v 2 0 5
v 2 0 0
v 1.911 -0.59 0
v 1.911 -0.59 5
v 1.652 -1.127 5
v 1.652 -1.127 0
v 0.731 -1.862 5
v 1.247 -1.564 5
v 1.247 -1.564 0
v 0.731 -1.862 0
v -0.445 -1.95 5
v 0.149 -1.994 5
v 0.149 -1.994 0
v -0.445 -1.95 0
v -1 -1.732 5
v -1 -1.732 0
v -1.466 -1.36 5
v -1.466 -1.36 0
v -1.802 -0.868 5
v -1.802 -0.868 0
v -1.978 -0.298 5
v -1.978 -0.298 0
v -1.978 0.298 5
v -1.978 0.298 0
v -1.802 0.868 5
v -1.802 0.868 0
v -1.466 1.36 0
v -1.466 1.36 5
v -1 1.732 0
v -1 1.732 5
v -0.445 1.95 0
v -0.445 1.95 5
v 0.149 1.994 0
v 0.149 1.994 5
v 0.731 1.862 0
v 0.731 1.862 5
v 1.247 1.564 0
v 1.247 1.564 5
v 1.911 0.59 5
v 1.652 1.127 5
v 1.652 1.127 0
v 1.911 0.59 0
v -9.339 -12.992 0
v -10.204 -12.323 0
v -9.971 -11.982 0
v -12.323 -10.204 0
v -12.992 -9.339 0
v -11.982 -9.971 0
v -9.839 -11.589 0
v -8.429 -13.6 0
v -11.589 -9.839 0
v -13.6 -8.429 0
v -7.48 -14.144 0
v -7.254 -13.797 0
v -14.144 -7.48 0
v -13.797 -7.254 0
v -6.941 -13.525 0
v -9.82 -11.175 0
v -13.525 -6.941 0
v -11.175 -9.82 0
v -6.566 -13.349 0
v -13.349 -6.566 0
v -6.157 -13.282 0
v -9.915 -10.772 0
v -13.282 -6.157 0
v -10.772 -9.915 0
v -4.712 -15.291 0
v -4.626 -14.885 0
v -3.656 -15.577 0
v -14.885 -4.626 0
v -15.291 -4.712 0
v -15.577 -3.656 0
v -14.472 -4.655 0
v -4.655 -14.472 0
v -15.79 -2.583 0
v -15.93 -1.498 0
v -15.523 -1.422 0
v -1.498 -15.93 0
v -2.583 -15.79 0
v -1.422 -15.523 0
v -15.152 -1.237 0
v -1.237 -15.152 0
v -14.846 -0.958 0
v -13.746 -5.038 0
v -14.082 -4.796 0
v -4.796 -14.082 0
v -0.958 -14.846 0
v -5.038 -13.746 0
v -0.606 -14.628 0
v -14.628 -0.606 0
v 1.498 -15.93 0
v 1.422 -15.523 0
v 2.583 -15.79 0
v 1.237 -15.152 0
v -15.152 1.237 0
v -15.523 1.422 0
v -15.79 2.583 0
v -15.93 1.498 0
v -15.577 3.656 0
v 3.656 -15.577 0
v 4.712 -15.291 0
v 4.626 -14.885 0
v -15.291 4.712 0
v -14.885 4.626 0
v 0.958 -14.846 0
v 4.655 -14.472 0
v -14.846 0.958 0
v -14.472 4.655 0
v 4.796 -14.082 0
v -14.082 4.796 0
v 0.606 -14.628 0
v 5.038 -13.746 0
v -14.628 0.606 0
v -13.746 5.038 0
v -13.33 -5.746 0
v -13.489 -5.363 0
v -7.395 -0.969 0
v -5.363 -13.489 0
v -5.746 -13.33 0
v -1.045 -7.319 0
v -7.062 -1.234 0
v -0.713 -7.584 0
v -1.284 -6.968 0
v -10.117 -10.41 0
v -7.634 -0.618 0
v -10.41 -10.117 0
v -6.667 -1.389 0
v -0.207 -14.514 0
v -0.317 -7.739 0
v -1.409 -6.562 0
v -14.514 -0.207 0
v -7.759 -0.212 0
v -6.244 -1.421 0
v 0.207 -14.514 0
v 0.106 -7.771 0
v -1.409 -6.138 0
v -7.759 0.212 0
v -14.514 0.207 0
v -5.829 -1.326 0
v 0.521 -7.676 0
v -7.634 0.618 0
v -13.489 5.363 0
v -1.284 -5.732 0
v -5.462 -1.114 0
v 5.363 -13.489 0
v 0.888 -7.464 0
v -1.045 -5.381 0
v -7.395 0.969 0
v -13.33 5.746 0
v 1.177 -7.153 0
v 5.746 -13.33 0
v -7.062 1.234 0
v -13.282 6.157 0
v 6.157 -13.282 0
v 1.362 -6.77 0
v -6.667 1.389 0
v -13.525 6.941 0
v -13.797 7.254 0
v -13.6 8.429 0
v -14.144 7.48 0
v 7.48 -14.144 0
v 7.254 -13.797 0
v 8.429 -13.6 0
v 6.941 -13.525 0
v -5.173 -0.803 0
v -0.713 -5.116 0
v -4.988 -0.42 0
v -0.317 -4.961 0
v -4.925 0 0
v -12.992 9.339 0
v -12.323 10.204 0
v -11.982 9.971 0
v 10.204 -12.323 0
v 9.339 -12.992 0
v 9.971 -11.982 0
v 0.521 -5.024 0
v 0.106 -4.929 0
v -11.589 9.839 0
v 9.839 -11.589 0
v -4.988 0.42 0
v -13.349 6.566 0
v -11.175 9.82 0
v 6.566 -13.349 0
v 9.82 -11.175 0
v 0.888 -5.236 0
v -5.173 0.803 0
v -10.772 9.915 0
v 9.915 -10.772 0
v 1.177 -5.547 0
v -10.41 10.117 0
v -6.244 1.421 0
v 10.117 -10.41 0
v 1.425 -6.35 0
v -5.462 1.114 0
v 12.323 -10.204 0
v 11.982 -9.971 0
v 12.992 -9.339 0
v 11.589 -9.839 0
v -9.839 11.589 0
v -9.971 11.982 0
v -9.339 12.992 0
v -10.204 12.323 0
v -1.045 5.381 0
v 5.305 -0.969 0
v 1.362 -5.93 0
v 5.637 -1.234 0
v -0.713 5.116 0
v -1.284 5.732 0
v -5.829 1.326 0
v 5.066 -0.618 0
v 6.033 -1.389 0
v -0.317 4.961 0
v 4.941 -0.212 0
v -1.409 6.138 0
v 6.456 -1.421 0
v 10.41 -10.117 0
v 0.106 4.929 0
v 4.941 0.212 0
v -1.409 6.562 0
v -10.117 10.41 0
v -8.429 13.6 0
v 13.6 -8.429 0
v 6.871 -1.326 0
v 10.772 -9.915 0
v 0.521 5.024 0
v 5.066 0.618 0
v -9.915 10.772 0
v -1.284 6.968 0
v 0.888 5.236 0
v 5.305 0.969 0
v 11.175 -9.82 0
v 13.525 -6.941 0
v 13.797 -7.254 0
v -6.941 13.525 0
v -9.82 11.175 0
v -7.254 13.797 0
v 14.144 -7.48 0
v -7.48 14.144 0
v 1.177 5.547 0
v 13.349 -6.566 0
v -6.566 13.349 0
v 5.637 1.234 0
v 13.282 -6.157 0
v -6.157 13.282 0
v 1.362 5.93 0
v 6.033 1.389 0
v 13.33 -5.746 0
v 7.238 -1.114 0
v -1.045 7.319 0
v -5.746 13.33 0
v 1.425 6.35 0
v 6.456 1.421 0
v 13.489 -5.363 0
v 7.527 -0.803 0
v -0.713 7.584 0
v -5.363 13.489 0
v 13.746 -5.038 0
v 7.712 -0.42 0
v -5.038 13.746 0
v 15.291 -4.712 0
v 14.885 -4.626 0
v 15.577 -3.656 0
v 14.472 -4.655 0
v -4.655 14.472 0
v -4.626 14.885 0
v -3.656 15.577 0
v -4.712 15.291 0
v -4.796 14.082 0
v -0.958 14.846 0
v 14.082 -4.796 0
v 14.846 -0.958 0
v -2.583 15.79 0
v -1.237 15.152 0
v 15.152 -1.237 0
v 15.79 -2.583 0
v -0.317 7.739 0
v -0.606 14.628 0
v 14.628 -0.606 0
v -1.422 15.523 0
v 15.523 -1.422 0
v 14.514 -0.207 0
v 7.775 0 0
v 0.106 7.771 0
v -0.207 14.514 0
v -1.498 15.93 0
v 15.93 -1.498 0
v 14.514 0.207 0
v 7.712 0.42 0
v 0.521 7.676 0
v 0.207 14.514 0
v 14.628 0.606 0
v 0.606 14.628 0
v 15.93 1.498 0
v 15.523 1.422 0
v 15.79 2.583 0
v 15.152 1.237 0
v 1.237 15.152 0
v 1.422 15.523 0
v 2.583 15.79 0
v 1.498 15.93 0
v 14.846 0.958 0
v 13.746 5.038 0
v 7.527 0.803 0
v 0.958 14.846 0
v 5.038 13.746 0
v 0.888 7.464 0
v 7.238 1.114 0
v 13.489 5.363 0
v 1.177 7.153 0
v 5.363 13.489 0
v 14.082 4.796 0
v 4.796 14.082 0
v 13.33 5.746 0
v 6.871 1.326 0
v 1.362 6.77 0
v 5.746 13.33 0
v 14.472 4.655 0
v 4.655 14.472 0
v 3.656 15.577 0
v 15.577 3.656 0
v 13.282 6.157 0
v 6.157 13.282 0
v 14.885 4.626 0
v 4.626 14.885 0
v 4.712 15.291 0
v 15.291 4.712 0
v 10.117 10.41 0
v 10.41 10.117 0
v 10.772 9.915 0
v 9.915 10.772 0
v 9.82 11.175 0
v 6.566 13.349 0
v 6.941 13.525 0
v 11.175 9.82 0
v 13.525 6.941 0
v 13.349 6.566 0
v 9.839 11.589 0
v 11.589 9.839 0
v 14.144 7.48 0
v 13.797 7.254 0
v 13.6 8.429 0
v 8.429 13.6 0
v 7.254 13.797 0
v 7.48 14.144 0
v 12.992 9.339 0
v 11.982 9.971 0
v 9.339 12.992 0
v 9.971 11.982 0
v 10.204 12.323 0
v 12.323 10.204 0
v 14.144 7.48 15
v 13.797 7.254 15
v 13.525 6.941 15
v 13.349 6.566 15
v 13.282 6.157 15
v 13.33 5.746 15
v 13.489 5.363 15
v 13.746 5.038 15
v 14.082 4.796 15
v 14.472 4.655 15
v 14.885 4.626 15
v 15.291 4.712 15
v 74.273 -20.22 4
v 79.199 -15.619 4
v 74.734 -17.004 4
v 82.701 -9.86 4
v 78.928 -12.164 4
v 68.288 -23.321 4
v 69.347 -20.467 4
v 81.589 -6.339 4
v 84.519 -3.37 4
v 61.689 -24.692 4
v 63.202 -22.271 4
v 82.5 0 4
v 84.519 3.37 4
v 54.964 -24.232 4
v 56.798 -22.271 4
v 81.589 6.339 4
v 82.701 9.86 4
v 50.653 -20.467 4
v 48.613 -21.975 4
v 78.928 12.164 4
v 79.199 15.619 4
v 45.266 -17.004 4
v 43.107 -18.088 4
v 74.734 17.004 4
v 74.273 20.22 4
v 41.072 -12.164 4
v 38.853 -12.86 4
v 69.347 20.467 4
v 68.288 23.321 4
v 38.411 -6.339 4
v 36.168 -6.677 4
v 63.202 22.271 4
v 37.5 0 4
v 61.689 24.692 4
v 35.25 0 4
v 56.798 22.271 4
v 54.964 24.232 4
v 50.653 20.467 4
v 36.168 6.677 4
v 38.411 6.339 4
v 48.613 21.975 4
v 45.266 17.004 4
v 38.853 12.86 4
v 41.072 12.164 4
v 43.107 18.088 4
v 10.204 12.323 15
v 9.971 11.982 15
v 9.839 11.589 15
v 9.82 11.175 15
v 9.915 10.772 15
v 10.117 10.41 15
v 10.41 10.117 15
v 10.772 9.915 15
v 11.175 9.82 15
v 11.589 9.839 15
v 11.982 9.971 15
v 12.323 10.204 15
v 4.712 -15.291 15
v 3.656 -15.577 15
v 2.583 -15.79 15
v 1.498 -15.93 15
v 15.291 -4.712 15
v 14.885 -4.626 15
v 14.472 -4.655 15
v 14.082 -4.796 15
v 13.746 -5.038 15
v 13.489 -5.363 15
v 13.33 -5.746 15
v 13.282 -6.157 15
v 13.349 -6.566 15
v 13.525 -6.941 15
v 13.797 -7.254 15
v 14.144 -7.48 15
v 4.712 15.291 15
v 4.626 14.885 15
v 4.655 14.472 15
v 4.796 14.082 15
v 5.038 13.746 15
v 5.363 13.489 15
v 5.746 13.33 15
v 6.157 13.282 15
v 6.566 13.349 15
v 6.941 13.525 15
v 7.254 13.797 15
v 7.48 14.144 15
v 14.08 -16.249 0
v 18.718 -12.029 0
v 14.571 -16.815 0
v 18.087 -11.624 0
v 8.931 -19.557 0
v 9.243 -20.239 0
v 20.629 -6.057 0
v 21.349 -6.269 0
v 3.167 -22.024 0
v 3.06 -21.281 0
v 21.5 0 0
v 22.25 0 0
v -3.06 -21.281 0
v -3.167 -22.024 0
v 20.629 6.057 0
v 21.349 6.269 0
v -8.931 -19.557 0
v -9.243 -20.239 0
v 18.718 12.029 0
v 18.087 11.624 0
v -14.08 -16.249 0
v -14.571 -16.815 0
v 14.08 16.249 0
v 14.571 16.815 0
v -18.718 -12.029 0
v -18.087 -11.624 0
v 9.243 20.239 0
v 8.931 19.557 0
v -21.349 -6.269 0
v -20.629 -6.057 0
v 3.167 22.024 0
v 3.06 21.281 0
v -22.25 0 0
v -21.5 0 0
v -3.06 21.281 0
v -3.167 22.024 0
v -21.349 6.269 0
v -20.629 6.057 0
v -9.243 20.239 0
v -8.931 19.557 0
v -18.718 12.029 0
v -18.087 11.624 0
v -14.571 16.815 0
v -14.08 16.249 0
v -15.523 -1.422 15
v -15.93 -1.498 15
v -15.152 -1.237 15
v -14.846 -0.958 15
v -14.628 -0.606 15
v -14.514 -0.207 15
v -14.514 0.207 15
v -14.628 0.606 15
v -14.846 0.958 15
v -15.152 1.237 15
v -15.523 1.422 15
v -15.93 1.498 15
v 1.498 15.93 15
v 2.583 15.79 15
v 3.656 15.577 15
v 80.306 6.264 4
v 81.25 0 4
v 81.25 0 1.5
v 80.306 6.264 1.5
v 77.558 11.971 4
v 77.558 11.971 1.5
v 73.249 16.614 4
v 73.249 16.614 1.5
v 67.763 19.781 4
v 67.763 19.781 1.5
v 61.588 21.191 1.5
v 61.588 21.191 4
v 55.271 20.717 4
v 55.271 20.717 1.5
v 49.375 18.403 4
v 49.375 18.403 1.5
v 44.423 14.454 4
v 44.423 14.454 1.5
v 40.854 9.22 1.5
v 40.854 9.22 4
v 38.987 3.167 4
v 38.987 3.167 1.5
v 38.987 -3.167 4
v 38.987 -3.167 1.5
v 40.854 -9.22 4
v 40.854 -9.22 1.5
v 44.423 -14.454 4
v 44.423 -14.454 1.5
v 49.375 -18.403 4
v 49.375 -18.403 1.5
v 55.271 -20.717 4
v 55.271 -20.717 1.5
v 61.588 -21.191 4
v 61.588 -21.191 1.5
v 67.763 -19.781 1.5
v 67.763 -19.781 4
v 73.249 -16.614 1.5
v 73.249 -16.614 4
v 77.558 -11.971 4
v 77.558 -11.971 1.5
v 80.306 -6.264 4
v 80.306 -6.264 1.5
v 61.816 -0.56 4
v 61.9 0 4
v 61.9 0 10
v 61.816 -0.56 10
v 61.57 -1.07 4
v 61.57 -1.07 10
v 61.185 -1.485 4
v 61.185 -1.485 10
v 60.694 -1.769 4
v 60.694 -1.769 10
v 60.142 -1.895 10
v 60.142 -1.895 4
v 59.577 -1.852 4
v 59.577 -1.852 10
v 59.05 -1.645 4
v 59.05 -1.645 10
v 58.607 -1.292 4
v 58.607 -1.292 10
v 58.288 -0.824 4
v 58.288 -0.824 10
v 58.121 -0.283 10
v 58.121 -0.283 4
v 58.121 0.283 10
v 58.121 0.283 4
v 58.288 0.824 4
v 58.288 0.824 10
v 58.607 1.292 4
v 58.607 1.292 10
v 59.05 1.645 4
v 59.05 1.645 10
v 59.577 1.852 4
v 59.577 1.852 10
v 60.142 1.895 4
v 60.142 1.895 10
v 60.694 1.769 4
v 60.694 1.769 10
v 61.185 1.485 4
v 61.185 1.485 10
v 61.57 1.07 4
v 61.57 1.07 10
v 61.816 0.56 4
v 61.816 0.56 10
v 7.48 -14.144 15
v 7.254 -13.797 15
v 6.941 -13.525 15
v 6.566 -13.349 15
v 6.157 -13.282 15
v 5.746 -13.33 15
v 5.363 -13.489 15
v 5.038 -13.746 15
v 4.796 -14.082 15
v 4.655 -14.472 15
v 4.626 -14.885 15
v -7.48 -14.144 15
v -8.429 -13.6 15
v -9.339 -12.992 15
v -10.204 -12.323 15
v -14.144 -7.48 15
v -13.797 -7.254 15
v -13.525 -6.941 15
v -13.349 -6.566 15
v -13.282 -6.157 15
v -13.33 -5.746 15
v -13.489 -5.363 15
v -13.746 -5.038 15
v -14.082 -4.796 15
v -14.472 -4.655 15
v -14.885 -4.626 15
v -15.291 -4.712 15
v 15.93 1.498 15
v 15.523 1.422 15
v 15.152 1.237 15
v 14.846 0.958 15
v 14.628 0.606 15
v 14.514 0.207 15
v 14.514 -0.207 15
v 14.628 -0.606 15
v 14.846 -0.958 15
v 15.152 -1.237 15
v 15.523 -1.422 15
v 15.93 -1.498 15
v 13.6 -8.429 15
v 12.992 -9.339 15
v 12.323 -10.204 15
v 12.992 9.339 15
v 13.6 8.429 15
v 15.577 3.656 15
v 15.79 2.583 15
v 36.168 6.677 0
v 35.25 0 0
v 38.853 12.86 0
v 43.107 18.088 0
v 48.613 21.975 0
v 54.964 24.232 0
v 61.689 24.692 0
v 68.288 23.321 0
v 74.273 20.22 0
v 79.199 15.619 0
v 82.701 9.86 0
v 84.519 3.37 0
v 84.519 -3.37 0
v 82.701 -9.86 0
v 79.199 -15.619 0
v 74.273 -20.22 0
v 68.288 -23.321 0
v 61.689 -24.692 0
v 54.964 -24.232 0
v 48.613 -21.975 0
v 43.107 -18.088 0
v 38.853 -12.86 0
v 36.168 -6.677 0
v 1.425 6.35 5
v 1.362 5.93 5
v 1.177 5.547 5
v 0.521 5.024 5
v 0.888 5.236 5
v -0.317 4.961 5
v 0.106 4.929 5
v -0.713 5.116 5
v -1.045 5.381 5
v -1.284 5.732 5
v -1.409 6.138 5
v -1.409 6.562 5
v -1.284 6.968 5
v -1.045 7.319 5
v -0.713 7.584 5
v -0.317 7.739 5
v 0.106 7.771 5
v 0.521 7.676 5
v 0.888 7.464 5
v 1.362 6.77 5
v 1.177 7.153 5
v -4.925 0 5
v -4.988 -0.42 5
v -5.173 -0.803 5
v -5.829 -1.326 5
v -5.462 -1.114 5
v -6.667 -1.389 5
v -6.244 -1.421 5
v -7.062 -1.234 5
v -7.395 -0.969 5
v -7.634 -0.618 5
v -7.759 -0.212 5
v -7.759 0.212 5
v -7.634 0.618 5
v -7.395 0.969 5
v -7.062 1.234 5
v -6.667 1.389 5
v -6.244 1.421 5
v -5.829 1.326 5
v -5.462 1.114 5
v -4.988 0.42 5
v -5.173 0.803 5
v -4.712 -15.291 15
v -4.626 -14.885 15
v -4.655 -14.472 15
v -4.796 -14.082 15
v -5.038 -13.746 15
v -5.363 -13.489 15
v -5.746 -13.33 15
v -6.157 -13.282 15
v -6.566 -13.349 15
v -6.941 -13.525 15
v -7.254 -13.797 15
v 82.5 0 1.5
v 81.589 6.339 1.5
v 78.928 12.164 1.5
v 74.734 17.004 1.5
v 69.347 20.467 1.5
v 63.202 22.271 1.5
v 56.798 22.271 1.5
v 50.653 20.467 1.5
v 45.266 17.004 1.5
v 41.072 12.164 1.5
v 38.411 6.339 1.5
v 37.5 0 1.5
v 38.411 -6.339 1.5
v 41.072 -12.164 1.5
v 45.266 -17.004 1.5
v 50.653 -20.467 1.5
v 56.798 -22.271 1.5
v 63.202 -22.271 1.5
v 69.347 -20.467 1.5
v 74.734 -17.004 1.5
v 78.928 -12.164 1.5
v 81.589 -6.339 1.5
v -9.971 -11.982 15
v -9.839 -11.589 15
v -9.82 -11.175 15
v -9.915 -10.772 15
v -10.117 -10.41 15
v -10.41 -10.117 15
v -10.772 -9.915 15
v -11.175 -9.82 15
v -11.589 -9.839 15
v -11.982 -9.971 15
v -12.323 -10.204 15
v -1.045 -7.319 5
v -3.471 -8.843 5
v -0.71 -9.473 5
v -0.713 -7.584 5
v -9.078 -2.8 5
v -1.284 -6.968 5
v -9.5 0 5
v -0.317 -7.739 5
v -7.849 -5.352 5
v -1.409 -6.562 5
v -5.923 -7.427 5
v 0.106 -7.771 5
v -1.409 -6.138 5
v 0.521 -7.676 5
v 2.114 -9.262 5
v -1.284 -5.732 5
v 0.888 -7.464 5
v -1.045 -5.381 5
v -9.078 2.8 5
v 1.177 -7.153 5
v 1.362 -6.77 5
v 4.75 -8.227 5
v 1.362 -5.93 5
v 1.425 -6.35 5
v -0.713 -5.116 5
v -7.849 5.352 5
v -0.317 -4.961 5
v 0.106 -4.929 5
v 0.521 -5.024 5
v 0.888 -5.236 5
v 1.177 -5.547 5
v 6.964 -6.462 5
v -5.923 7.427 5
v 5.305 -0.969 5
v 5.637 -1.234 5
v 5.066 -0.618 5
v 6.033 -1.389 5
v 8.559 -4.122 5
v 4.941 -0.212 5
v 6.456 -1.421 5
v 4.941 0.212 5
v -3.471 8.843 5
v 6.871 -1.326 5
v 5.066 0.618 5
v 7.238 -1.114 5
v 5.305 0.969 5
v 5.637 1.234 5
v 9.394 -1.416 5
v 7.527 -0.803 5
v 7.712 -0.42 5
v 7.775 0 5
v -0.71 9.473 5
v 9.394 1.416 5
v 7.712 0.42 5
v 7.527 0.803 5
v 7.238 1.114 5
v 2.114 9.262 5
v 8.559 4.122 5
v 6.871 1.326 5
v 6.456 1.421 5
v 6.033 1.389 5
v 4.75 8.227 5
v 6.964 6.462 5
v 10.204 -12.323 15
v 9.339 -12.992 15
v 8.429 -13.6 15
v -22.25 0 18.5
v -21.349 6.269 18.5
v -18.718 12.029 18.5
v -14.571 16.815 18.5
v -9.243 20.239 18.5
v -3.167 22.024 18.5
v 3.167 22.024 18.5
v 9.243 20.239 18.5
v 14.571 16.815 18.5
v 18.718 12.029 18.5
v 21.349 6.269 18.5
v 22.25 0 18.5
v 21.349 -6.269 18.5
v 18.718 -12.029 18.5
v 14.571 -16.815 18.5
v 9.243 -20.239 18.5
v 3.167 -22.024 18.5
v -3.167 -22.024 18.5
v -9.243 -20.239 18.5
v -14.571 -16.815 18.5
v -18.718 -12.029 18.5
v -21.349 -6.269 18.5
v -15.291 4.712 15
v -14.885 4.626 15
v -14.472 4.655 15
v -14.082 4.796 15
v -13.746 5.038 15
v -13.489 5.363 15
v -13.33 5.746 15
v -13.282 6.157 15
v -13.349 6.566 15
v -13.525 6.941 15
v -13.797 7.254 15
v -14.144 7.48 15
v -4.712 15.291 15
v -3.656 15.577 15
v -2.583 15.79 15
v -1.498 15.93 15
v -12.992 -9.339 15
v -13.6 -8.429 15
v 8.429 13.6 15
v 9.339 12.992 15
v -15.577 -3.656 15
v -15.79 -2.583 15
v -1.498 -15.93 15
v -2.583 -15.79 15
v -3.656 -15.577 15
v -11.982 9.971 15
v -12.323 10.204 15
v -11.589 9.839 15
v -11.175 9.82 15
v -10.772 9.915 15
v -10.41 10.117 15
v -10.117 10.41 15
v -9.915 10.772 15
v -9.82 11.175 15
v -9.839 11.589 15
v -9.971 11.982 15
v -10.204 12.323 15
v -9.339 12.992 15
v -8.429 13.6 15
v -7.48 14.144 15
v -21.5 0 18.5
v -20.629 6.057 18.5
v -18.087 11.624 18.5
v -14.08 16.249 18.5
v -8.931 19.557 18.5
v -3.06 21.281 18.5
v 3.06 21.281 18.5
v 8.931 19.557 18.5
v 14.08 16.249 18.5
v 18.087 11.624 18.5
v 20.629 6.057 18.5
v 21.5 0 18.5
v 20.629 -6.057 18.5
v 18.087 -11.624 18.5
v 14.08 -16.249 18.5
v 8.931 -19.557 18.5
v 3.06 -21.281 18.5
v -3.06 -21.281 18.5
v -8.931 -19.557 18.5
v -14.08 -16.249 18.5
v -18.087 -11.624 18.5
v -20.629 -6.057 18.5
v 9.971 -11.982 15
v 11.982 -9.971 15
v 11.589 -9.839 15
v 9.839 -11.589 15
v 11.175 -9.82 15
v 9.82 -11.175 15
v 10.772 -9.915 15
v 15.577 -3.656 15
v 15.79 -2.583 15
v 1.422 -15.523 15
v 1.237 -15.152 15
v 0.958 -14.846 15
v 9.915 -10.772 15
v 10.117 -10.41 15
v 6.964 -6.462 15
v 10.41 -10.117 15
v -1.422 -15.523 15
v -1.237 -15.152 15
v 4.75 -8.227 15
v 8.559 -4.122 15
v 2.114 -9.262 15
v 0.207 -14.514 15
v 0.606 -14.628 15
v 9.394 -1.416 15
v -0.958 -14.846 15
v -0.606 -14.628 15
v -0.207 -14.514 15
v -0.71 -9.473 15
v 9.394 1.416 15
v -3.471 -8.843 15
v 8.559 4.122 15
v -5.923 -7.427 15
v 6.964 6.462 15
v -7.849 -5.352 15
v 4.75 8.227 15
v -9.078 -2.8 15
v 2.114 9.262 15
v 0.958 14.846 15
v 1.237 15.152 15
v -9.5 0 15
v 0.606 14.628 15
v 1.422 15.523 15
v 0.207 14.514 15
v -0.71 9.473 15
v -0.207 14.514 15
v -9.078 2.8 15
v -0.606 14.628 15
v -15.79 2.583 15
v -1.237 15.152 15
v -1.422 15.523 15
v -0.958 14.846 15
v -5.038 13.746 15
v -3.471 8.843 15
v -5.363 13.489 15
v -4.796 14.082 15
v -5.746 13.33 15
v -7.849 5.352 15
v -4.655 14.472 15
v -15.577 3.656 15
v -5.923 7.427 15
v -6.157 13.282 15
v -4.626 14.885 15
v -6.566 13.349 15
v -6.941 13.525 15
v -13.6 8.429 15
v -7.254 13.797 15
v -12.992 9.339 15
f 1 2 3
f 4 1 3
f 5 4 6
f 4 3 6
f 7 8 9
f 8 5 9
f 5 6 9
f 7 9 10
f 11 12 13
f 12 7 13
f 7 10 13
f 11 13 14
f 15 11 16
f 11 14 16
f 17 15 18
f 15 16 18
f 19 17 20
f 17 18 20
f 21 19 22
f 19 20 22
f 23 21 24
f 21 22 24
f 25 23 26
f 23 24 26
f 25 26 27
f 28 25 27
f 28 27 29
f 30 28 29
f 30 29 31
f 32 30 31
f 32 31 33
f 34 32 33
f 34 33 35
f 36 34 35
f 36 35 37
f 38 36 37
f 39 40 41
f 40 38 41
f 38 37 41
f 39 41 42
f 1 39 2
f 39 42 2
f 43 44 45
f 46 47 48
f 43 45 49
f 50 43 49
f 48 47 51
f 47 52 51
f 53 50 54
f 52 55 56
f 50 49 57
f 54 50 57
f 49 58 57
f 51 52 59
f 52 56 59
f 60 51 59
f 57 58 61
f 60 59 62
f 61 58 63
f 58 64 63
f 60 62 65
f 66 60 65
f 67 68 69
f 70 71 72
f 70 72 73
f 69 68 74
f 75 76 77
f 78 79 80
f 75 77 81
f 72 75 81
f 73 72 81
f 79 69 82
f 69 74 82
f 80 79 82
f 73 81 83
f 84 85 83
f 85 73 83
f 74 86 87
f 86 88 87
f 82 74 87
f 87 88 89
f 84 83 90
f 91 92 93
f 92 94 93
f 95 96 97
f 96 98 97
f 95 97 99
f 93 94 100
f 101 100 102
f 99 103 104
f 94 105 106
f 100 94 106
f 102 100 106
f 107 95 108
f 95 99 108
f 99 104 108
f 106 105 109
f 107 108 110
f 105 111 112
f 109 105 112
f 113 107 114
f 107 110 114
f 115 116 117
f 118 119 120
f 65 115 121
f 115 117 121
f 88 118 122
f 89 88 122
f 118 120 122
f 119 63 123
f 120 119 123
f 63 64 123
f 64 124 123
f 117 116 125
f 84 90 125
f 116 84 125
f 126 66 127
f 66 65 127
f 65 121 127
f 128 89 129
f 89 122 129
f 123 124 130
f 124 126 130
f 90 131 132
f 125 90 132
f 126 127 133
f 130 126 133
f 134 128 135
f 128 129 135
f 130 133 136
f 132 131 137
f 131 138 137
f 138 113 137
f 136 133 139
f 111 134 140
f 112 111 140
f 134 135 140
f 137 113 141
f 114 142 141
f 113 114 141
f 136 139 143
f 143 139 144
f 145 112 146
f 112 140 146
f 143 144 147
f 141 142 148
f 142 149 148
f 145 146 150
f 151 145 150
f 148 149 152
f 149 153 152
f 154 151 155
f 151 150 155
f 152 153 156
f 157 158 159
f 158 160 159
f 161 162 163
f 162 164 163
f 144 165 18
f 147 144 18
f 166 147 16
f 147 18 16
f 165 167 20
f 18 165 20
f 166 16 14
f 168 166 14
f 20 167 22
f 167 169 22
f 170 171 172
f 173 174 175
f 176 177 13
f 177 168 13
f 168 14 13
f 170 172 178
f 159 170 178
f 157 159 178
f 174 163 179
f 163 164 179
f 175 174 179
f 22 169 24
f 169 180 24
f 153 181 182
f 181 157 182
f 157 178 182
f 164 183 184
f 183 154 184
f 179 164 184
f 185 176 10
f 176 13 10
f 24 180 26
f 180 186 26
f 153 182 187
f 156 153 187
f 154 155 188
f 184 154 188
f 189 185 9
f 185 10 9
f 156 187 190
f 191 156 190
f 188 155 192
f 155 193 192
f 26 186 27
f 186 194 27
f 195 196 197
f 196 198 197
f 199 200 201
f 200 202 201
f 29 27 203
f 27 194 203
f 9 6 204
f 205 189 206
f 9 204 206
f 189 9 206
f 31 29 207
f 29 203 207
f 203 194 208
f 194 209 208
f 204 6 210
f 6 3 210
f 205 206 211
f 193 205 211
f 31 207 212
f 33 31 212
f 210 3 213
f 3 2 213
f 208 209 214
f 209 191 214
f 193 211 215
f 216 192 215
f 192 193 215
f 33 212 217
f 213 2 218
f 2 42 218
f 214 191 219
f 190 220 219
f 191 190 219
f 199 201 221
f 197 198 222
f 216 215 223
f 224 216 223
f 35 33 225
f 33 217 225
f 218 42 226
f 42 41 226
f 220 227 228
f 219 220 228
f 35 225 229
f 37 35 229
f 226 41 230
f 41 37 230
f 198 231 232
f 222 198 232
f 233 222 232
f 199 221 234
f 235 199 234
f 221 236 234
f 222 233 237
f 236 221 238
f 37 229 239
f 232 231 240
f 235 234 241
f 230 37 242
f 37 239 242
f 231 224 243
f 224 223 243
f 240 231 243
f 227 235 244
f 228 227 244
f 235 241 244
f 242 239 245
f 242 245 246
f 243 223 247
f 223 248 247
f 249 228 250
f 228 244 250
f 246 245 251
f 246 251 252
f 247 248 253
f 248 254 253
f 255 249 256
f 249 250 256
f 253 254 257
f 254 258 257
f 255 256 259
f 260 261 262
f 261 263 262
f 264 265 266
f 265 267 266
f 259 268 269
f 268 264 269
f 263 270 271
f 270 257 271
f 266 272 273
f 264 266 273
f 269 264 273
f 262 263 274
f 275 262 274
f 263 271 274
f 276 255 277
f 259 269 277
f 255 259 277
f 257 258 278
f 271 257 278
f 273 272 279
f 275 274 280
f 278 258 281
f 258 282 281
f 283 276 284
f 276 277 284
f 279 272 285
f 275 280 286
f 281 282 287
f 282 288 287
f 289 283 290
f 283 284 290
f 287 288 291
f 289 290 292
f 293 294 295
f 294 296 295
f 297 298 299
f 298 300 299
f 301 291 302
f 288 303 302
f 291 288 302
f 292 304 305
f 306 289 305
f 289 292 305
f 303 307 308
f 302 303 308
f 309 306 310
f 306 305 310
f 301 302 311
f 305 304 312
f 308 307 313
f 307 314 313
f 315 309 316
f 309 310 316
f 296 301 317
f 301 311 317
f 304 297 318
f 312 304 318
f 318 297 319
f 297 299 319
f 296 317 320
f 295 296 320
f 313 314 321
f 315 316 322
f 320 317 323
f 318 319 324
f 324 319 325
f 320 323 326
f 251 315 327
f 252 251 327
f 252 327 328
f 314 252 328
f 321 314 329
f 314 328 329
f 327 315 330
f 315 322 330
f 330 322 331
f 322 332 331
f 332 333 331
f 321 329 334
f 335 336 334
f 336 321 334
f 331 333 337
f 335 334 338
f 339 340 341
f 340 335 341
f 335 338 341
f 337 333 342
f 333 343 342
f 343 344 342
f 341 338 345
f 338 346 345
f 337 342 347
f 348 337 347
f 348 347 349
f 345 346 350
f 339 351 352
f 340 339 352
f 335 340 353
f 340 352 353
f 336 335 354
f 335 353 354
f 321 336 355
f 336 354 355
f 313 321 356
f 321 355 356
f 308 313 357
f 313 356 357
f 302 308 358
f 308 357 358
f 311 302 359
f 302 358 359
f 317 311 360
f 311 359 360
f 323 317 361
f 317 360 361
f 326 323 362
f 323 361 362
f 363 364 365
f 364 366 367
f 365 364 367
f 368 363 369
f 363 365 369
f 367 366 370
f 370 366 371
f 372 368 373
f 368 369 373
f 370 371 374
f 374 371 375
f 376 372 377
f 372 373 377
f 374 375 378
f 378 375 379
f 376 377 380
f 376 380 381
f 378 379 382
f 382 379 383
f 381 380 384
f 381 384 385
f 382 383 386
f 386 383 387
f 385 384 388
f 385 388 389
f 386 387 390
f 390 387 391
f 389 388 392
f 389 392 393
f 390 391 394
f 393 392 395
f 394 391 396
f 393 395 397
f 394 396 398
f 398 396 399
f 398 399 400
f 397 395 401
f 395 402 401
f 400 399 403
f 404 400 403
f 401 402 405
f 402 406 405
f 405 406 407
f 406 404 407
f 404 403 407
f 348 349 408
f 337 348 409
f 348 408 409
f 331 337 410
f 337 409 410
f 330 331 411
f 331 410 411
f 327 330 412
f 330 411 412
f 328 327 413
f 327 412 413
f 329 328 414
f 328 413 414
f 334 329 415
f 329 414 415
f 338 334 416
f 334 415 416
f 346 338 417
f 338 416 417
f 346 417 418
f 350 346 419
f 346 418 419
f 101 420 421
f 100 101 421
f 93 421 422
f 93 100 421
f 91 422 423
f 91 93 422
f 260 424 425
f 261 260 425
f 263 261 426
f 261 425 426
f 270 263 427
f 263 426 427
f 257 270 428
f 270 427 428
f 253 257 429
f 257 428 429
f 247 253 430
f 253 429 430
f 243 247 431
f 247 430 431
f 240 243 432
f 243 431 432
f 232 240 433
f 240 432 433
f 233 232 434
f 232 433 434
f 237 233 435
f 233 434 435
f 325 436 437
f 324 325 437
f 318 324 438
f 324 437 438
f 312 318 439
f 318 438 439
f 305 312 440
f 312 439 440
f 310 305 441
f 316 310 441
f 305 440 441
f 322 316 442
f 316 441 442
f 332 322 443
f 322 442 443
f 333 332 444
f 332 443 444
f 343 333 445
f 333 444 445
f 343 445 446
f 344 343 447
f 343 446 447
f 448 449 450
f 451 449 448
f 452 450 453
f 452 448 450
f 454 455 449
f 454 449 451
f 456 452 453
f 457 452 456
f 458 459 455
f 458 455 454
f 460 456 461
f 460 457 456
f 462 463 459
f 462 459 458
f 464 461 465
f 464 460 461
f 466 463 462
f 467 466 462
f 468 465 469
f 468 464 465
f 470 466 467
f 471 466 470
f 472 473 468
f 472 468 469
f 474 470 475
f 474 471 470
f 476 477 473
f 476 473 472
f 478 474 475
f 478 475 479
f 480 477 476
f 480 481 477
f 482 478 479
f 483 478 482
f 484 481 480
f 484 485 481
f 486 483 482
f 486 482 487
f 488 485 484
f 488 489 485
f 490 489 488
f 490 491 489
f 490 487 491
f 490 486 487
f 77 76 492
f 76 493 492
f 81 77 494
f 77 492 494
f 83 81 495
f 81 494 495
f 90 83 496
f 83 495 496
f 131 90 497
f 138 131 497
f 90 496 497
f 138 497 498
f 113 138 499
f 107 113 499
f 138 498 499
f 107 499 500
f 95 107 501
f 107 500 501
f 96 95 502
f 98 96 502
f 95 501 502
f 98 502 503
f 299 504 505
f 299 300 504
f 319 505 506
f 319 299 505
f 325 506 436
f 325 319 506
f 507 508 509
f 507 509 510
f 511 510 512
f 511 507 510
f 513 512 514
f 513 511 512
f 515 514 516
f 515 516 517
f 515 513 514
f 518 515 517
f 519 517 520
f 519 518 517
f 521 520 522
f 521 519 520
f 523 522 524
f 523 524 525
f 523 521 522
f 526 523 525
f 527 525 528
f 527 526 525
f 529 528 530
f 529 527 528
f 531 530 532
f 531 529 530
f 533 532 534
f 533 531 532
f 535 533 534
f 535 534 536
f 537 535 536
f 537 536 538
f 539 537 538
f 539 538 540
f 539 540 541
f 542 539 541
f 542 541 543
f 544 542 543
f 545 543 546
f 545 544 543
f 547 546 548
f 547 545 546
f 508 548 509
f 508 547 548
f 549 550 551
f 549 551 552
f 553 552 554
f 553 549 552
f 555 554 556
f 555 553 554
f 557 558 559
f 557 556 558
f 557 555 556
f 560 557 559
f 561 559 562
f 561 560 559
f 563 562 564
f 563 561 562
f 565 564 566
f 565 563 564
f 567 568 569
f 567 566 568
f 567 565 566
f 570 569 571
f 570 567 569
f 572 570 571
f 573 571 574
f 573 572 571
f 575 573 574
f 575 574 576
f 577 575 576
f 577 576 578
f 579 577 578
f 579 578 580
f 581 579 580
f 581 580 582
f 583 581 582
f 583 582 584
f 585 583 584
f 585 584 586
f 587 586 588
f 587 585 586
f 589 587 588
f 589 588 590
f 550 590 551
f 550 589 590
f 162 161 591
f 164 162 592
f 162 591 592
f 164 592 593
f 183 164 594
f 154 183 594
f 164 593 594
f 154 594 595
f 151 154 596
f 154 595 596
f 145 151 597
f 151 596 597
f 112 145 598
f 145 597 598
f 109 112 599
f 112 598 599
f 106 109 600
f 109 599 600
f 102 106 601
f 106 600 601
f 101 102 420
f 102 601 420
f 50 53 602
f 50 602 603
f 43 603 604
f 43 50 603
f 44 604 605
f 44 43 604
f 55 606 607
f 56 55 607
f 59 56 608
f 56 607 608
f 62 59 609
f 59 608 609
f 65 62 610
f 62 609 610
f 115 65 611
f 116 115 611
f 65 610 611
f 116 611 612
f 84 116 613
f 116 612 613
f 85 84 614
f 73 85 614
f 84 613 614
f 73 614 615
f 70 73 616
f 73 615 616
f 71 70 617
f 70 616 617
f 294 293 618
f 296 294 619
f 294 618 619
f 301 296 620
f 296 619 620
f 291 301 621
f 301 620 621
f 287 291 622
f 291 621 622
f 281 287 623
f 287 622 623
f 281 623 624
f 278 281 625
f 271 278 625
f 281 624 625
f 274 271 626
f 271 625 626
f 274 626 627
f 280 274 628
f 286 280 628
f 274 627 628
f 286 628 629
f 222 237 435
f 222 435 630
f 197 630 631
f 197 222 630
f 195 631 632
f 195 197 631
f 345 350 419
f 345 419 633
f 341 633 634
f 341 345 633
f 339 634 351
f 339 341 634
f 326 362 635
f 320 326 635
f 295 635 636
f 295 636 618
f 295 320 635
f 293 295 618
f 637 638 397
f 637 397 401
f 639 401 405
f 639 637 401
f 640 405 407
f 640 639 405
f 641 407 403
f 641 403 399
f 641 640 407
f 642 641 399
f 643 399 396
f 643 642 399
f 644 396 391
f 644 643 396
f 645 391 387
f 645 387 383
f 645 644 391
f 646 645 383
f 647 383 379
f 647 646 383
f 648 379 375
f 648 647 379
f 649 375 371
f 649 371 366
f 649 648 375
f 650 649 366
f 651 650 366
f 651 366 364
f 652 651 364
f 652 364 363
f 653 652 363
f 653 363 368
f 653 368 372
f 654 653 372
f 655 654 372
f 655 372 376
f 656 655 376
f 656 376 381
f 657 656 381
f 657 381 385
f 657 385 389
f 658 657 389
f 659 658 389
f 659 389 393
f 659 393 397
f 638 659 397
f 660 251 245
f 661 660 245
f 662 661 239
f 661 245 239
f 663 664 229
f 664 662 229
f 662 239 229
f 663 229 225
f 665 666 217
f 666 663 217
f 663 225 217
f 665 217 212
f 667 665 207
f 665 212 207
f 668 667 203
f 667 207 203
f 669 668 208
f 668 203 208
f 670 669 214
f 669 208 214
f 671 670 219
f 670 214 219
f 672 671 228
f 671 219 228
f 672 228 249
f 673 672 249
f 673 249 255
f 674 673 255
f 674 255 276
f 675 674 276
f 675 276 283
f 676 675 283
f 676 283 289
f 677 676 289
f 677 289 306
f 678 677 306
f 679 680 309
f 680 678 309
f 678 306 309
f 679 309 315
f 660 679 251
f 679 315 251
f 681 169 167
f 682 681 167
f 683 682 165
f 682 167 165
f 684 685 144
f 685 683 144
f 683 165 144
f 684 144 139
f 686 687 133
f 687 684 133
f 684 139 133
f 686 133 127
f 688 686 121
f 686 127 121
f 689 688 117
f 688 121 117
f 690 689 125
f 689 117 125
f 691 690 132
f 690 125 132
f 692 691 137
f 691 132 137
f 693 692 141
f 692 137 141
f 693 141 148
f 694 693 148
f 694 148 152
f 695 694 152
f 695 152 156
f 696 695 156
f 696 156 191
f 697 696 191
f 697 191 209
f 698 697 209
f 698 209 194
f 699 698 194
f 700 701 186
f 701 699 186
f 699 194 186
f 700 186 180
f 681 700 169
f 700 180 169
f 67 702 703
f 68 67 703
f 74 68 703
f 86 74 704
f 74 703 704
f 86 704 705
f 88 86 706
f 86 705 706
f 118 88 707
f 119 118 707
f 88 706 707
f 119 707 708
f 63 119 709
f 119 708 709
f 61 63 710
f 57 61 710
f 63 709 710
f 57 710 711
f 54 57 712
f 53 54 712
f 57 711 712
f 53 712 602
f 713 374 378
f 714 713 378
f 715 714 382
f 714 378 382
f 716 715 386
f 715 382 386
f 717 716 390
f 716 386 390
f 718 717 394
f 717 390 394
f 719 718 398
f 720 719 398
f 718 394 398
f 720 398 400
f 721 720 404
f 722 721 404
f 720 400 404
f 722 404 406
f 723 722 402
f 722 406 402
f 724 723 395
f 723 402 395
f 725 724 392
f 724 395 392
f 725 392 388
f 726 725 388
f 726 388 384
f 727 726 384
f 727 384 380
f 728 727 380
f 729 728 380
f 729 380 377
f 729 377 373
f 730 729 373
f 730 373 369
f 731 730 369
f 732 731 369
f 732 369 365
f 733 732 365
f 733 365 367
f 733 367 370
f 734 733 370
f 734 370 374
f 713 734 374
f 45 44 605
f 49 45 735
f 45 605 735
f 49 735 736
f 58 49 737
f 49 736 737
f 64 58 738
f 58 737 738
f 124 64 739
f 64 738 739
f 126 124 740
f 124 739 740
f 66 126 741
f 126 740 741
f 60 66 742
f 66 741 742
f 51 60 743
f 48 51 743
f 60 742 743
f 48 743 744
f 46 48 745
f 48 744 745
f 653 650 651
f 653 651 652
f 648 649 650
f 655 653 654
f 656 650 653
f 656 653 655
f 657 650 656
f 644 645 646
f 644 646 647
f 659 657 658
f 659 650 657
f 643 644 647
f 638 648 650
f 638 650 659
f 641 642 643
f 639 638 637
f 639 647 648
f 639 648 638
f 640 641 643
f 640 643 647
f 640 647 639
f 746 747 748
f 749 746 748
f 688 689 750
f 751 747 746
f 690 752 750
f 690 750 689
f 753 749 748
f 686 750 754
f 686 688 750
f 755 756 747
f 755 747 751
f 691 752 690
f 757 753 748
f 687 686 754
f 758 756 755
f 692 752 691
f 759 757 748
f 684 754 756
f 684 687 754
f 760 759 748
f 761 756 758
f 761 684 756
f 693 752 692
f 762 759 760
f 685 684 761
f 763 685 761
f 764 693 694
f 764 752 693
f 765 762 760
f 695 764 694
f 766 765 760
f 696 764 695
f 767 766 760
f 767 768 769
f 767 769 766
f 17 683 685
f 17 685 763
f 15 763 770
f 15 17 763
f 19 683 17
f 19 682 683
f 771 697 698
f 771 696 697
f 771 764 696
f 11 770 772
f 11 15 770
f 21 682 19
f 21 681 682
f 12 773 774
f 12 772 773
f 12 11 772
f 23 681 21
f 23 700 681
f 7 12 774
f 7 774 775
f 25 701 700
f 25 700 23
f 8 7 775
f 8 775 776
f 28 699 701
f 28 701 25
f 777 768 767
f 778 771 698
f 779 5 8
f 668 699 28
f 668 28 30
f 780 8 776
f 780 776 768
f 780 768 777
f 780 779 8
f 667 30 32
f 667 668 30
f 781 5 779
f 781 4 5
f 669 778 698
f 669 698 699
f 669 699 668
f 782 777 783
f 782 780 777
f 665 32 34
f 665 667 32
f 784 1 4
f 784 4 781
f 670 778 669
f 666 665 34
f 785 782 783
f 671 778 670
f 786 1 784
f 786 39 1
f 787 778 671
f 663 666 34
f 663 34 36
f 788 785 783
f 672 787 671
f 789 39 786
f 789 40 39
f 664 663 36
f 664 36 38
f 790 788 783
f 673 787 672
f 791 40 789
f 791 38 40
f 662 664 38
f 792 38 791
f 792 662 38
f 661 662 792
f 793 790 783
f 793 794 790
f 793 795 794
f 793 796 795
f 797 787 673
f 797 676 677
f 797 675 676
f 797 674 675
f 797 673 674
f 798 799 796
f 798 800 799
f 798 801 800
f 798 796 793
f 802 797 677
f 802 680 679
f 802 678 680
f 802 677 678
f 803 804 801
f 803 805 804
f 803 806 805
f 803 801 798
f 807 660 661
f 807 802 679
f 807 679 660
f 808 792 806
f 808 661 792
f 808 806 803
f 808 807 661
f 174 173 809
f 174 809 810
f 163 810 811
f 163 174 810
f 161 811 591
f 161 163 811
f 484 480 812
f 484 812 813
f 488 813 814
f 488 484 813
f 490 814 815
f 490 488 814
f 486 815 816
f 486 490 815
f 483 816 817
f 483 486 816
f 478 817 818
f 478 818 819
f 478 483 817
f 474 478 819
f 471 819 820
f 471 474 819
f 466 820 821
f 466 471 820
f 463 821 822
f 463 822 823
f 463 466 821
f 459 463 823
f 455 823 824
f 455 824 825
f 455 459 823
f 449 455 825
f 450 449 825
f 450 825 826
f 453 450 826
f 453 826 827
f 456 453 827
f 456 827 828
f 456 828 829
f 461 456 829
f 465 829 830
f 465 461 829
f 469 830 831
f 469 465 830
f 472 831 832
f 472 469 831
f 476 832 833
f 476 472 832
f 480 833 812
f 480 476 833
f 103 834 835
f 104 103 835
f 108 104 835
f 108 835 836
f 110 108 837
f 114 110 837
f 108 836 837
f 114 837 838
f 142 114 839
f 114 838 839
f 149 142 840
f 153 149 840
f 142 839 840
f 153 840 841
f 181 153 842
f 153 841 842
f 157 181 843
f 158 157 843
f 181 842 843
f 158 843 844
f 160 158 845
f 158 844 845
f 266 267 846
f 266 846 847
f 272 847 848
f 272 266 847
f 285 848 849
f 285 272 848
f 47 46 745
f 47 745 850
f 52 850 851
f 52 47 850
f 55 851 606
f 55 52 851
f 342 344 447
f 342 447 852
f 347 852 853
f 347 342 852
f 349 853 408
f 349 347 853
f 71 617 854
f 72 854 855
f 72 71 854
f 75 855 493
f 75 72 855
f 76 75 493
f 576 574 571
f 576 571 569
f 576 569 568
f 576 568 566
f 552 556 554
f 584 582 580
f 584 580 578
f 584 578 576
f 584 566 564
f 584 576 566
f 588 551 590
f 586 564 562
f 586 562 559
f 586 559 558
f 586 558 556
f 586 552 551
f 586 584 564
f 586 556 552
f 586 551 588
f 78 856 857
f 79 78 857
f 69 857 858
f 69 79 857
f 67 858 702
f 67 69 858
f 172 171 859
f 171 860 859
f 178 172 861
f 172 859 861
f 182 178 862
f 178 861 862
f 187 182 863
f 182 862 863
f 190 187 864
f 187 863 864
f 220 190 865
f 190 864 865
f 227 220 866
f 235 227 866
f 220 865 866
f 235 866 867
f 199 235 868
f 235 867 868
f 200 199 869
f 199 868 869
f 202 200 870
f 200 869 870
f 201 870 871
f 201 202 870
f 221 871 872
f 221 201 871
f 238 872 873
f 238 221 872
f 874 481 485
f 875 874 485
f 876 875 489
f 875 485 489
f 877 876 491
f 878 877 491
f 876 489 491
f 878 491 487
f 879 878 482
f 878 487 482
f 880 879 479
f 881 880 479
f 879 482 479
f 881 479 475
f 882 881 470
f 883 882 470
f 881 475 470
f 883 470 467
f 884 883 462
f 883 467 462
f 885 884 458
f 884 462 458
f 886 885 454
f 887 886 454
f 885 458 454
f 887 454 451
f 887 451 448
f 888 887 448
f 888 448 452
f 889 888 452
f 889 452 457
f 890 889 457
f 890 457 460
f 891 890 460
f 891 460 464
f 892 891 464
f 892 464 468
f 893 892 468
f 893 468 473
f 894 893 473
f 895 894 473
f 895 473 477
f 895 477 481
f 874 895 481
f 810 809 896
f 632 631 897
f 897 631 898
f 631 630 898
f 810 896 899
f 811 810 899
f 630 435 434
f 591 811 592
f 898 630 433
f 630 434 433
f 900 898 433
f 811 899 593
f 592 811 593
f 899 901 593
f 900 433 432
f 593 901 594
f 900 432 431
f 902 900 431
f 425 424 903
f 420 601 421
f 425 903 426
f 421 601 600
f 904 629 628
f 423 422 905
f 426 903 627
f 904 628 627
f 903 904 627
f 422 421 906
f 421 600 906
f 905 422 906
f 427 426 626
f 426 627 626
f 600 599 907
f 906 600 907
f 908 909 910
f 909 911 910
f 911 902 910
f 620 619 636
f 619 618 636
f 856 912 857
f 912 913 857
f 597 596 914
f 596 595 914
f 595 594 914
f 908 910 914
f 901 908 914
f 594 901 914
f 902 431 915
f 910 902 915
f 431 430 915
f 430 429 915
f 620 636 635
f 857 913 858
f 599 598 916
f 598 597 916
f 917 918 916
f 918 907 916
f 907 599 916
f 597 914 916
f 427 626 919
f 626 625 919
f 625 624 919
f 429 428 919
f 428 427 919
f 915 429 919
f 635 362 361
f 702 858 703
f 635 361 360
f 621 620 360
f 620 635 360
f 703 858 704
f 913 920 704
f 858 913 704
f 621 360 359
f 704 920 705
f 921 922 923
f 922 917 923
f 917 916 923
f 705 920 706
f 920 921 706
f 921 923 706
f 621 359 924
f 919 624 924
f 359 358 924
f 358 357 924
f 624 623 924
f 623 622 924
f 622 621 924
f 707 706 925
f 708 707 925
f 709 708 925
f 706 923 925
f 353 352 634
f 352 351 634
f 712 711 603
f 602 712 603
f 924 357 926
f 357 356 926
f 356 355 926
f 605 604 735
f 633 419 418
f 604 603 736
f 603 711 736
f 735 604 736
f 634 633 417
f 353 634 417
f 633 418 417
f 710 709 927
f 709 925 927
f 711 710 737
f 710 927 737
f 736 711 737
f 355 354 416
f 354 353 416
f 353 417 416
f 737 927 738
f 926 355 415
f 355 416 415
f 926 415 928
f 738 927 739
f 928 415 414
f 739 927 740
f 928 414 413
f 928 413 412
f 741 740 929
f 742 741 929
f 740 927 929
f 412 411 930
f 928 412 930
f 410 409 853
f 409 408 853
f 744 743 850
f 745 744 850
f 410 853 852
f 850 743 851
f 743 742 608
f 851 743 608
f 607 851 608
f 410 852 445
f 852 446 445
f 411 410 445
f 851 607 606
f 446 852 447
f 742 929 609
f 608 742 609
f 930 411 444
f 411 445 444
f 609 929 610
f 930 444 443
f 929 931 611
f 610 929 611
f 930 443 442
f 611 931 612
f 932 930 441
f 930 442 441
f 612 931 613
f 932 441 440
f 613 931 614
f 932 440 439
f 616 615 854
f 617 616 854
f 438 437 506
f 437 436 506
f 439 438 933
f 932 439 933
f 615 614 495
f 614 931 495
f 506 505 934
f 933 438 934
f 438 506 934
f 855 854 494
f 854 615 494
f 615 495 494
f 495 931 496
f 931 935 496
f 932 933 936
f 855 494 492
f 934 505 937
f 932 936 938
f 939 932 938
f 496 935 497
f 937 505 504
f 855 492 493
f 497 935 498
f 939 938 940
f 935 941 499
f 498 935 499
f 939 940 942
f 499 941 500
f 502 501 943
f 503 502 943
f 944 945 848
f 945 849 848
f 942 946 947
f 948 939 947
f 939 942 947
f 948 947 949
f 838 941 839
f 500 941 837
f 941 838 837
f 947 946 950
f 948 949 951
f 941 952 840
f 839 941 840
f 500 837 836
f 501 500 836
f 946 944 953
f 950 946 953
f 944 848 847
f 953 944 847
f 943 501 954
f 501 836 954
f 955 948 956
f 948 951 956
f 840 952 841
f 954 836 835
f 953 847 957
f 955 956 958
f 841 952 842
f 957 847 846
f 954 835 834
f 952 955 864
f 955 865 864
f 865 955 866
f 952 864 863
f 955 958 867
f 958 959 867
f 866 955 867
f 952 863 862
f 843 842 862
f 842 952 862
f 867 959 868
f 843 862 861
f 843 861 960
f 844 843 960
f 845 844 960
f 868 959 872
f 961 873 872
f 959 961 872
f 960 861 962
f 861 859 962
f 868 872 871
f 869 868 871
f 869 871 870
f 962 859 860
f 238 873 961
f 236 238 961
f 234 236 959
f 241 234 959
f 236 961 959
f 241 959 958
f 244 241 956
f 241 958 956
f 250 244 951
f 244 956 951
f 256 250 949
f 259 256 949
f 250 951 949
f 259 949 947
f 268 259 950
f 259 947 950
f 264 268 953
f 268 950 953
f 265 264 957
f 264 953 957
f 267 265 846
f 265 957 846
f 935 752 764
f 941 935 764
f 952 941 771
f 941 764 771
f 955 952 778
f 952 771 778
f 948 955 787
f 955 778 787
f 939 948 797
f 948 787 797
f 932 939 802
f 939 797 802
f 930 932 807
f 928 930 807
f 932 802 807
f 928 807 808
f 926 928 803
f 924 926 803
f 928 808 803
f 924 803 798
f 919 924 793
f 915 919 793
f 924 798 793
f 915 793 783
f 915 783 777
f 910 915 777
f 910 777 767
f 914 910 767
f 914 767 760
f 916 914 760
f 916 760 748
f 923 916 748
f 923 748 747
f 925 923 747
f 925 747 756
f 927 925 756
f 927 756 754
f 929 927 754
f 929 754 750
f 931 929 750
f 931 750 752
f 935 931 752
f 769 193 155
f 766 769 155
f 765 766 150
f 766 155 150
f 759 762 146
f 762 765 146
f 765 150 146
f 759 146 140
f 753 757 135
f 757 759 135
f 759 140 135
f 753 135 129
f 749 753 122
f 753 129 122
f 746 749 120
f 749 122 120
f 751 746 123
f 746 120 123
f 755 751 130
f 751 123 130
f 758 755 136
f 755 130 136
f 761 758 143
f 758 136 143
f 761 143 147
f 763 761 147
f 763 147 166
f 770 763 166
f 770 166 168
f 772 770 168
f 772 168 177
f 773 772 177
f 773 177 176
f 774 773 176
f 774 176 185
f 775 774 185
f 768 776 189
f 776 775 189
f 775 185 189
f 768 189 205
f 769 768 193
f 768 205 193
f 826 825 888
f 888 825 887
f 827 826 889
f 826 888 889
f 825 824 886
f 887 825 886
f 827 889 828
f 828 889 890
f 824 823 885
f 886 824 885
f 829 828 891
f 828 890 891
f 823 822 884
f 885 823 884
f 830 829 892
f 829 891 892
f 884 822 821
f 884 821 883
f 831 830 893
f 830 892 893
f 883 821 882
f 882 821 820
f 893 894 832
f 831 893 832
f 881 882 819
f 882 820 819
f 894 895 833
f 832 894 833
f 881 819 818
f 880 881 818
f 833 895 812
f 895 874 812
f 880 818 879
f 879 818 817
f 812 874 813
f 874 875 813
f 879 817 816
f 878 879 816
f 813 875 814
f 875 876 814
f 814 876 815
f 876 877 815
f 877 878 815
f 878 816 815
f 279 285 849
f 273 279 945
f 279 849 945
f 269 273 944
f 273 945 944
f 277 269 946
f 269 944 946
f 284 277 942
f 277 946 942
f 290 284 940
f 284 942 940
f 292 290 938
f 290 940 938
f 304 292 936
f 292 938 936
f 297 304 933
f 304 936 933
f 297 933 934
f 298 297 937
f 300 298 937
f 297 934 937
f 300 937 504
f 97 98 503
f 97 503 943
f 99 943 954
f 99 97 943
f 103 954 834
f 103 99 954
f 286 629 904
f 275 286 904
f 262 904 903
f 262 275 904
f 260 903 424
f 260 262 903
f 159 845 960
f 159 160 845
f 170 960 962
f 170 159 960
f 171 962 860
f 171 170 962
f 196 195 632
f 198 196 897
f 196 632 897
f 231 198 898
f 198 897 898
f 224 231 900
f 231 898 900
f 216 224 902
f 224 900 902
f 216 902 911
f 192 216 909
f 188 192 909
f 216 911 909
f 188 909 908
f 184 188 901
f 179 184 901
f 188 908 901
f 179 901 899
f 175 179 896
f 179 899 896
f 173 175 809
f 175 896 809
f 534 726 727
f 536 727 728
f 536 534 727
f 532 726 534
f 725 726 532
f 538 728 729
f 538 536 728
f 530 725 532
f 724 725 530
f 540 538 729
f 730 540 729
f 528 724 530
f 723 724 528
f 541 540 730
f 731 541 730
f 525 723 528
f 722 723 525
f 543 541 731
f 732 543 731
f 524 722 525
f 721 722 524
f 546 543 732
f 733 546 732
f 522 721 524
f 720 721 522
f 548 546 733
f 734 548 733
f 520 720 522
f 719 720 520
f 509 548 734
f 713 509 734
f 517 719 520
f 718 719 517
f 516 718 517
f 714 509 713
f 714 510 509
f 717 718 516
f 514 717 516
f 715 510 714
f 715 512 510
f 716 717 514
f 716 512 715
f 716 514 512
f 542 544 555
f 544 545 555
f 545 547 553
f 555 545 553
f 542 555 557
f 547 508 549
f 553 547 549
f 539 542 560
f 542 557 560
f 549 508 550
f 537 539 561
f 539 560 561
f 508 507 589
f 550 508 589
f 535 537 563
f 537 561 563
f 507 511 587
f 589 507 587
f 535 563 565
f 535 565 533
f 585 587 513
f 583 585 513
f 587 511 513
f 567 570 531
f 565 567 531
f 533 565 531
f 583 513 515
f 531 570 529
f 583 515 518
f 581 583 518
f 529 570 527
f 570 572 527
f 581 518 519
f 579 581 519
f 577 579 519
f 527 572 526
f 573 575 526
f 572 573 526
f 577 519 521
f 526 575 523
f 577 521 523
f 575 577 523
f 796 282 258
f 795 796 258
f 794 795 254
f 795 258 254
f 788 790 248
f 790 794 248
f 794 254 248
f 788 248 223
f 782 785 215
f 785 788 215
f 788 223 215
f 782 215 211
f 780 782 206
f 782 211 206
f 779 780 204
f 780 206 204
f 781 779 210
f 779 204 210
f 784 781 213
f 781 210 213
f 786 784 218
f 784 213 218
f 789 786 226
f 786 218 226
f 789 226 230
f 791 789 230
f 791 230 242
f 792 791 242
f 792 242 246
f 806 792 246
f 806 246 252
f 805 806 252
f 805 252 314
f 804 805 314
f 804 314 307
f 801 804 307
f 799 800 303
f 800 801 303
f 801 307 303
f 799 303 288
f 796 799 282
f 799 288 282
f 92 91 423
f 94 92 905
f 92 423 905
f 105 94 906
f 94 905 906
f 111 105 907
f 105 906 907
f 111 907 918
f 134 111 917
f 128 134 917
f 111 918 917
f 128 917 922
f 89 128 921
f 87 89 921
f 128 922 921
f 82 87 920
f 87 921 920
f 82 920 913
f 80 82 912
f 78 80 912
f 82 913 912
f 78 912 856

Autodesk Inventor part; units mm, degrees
ref_plane "YZ Plane" through (0, 0, 0) normal (1, 0, 0) x (0, 1, 0)
ref_plane "XZ Plane" through (0, 0, 0) normal (0, 1, 0) x (-1, 0, 0)
ref_plane "XY Plane" through (0, 0, 0) normal (0, 0, 1) x (1, 0, 0)
sketch "Sketch1" plane through (0, 0, 0) normal (0, 0, 1) x (1, 0, 0)
  circle A0 centre (0, 0) radius 9.5
  circle A1 centre (0, 6.35) radius 1.425
  circle A2 centre (6.35, 0) radius 1.425
  circle A3 centre (0, -6.35) radius 1.425
  circle A4 centre (-6.35, 0) radius 1.425
  circle A5 centre (0, 0) radius 2
  dimension "d0" = 19
  dimension "d1" = 2.85
  dimension "d2" = 2.85
  dimension "d3" = 2.85
  dimension "d4" = 2.85
  dimension "d5" = 4
  dimension "d6" = 6.35
  dimension "d7" = 6.35
  dimension "d8" = 6.35
  dimension "d9" = 6.35
extrude "Hub Mount" add sketch "Sketch1" along normal blind 5
sketch "Sketch2" plane through (0, 0, 0) normal (0, 0, -1) x (-1, 0, 0)
  circle A0 centre (0, 0) radius 9.5
  circle A1 centre (0, 0) radius 16
  dimension "d12" = 19
  dimension "d13" = 32
extrude "Tire Mount" add sketch "Sketch2" against normal blind 15
sketch "Sketch4" plane through (0, 0, 15) normal (0, 0, 1) x (1, 0, 0)
  circle A0 centre (0, 16) radius 1.5
  circle A1 centre (0, 0) radius 16 projected
  circle A2 centre (-16, 0) radius 1.5
  circle A3 centre (0, -16) radius 1.5
  circle A4 centre (16, 0) radius 1.5
  circle A5 centre (0, 0) radius 16 projected
  line L0 (-16, 0) -> (16, 0)
  circle A6 centre (11.3137, 11.3137) radius 1.5
  line L1 (11.3137, 11.3137) -> (0, 0)
  line L2 (0, 0) -> (6.1229, 14.7821)
  line L3 (0, 0) -> (14.7821, 6.1229)
  line L4 (0, 0) -> (14.7821, -6.1229)
  line L5 (0, 0) -> (11.3137, -11.3137)
  line L6 (0, 0) -> (6.1229, -14.7821)
  line L7 (0, 0) -> (-6.1229, -14.7821)
  line L8 (0, 0) -> (-11.3137, -11.3137)
  line L9 (0, 0) -> (-14.7821, -6.1229)
  line L10 (0, 16) -> (0, -16)
  line L11 (0, 0) -> (-6.1229, 14.7821)
  line L12 (0, 0) -> (-11.3137, 11.3137)
  line L13 (0, 0) -> (-14.7821, 6.1229)
  circle A7 centre (6.1229, 14.7821) radius 1.5
  circle A8 centre (14.7821, 6.1229) radius 1.5
  circle A9 centre (14.7821, -6.1229) radius 1.5
  circle A10 centre (11.3137, -11.3137) radius 1.5
  circle A11 centre (6.1229, -14.7821) radius 1.5
  circle A12 centre (-6.1229, -14.7821) radius 1.5
  circle A13 centre (-11.3137, -11.3137) radius 1.5
  circle A14 centre (-14.7821, -6.1229) radius 1.5
  circle A15 centre (-14.7821, 6.1229) radius 1.5
  circle A16 centre (-11.3137, 11.3137) radius 1.5
  circle A17 centre (-6.1229, 14.7821) radius 1.5
  dimension "d21" = 3
  dimension "d22" = 3
  dimension "d23" = 3
  dimension "d24" = 3
  dimension "d29" = 3
  dimension "d30" = 22.5
  dimension "d31" = 22.5
  dimension "d32" = 22.5
  dimension "d33" = 22.5
  dimension "d34" = 22.5
  dimension "d35" = 22.5
  dimension "d36" = 22.5
  dimension "d37" = 22.5
  dimension "d38" = 22.5
  dimension "d39" = 22.5
  dimension "d40" = 22.5
  dimension "d41" = 22.5
  dimension "d42" = 3
  dimension "d43" = 3
  dimension "d44" = 3
  dimension "d45" = 3
  dimension "d46" = 3
  dimension "d47" = 3
  dimension "d48" = 3
  dimension "d49" = 3
  dimension "d50" = 3
  dimension "d51" = 3
  dimension "d52" = 3
extrude "Tire Grip Extrusion" cut sketch "Sketch4" against normal through all contours A0 A1 | A1 L10 A0 | A0 L10 A1 | A17 L11 A1 | A1 A17 | A7 A1 | A1 L2 A7 | L11 A17 A1 | A1 A7 L2 | L0 A1 A2 | A2 A1 L0 | L0 A1 A4 | A4 A1 L0 | L1 A1 A6 | A6 A1 L1 | A8 A1 L3 | L3 A1 A8 | A9 A1 L4 | L4 A1 A9 | A10 A1 L5 | L5 A1 A10 | A11 A1 L6 | L6 A1 A11 | A12 A1 L7 | L7 A1 A12 | A13 A1 L8 | L8 A1 A13 | A14 A1 L9 | L9 A1 A14 | L10 A1 A3 | A3 A1 L10 | A16 A1 L12 | L12 A1 A16 | A15 A1 L13 | L13 A1 A15 | A1 A16 | A1 A2 | A4 A1 | A6 A1 | A1 A8 | A1 A9 | A1 A10 | A1 A11 | A1 A12 | A1 A13 | A1 A14 | A3 A1 | A1 A15
sketch "Sketch5" plane through (0, 0, 0) normal (0, 0, -1) x (-1, 0, 0)
  circle A0 centre (0, 0) radius 21.5
  circle A1 centre (0, 0) radius 22.25
  dimension "d55" = 43
  dimension "d56" = 44.5
extrude "Tire Mold Shell" add sketch "Sketch5" against normal blind 18.5
sketch "Sketch6" plane through (0, 0, 0) normal (0, 0, -1) x (-1, 0, 0)
  circle A0 centre (-60, 0) radius 24.75
  point P0 (0, 0)
  dimension "d59" = 49.5
  dimension "d60" = 60
extrude "Tire Mold Base" add sketch "Sketch6" against normal blind 4
sketch "Sketch7" plane through (60, 0, 4) normal (0, 0, 1) x (1, 0, 0)
  circle A0 centre (0, 0) radius 22.5
  circle A1 centre (0, 0) radius 21.25
  point P0 (-60, 0)
  dimension "d65" = 42.5
  dimension "d66" = 45
  dimension "d67" = 60
extrude "Inset into base for shell" cut sketch "Sketch7" against normal blind 2.5
sketch "Sketch8" plane through (60, 0, 4) normal (0, 0, 1) x (1, 0, 0)
  circle A0 centre (0, 0) radius 1.9
  point P0 (-60, 0)
  dimension "d70" = 3.8
  dimension "d71" = 60
extrude "Extrusion7" add sketch "Sketch8" along normal blind 6
equation "\"d2\" = d1"
equation "\"d3\" = d1"
equation "\"d4\" = d1"
equation "\"d7\" = d6"
equation "\"d8\" = d6"
equation "\"d9\" = d7"
equation "\"d22\" = d21"
equation "\"d23\" = d21"
equation "\"d24\" = d21"
equation "\"d29\" = d24"
equation "\"d31\" = d30"
equation "\"d32\" = d30"
equation "\"d33\" = d30"
equation "\"d34\" = d33"
equation "\"d35\" = d34"
equation "\"d36\" = d30"
equation "\"d37\" = d30"
equation "\"d38\" = d30"
equation "\"d39\" = d30"
equation "\"d40\" = d30"
equation "\"d41\" = d30"
equation "\"d42\" = d21"
equation "\"d43\" = d21"
equation "\"d44\" = d21"
equation "\"d45\" = d21"
equation "\"d46\" = d21"
equation "\"d47\" = d21"
equation "\"d48\" = d21"
equation "\"d49\" = d21"
equation "\"d50\" = d21"
equation "\"d51\" = d21"
equation "\"d52\" = d21"
properties part number "Wheel"
